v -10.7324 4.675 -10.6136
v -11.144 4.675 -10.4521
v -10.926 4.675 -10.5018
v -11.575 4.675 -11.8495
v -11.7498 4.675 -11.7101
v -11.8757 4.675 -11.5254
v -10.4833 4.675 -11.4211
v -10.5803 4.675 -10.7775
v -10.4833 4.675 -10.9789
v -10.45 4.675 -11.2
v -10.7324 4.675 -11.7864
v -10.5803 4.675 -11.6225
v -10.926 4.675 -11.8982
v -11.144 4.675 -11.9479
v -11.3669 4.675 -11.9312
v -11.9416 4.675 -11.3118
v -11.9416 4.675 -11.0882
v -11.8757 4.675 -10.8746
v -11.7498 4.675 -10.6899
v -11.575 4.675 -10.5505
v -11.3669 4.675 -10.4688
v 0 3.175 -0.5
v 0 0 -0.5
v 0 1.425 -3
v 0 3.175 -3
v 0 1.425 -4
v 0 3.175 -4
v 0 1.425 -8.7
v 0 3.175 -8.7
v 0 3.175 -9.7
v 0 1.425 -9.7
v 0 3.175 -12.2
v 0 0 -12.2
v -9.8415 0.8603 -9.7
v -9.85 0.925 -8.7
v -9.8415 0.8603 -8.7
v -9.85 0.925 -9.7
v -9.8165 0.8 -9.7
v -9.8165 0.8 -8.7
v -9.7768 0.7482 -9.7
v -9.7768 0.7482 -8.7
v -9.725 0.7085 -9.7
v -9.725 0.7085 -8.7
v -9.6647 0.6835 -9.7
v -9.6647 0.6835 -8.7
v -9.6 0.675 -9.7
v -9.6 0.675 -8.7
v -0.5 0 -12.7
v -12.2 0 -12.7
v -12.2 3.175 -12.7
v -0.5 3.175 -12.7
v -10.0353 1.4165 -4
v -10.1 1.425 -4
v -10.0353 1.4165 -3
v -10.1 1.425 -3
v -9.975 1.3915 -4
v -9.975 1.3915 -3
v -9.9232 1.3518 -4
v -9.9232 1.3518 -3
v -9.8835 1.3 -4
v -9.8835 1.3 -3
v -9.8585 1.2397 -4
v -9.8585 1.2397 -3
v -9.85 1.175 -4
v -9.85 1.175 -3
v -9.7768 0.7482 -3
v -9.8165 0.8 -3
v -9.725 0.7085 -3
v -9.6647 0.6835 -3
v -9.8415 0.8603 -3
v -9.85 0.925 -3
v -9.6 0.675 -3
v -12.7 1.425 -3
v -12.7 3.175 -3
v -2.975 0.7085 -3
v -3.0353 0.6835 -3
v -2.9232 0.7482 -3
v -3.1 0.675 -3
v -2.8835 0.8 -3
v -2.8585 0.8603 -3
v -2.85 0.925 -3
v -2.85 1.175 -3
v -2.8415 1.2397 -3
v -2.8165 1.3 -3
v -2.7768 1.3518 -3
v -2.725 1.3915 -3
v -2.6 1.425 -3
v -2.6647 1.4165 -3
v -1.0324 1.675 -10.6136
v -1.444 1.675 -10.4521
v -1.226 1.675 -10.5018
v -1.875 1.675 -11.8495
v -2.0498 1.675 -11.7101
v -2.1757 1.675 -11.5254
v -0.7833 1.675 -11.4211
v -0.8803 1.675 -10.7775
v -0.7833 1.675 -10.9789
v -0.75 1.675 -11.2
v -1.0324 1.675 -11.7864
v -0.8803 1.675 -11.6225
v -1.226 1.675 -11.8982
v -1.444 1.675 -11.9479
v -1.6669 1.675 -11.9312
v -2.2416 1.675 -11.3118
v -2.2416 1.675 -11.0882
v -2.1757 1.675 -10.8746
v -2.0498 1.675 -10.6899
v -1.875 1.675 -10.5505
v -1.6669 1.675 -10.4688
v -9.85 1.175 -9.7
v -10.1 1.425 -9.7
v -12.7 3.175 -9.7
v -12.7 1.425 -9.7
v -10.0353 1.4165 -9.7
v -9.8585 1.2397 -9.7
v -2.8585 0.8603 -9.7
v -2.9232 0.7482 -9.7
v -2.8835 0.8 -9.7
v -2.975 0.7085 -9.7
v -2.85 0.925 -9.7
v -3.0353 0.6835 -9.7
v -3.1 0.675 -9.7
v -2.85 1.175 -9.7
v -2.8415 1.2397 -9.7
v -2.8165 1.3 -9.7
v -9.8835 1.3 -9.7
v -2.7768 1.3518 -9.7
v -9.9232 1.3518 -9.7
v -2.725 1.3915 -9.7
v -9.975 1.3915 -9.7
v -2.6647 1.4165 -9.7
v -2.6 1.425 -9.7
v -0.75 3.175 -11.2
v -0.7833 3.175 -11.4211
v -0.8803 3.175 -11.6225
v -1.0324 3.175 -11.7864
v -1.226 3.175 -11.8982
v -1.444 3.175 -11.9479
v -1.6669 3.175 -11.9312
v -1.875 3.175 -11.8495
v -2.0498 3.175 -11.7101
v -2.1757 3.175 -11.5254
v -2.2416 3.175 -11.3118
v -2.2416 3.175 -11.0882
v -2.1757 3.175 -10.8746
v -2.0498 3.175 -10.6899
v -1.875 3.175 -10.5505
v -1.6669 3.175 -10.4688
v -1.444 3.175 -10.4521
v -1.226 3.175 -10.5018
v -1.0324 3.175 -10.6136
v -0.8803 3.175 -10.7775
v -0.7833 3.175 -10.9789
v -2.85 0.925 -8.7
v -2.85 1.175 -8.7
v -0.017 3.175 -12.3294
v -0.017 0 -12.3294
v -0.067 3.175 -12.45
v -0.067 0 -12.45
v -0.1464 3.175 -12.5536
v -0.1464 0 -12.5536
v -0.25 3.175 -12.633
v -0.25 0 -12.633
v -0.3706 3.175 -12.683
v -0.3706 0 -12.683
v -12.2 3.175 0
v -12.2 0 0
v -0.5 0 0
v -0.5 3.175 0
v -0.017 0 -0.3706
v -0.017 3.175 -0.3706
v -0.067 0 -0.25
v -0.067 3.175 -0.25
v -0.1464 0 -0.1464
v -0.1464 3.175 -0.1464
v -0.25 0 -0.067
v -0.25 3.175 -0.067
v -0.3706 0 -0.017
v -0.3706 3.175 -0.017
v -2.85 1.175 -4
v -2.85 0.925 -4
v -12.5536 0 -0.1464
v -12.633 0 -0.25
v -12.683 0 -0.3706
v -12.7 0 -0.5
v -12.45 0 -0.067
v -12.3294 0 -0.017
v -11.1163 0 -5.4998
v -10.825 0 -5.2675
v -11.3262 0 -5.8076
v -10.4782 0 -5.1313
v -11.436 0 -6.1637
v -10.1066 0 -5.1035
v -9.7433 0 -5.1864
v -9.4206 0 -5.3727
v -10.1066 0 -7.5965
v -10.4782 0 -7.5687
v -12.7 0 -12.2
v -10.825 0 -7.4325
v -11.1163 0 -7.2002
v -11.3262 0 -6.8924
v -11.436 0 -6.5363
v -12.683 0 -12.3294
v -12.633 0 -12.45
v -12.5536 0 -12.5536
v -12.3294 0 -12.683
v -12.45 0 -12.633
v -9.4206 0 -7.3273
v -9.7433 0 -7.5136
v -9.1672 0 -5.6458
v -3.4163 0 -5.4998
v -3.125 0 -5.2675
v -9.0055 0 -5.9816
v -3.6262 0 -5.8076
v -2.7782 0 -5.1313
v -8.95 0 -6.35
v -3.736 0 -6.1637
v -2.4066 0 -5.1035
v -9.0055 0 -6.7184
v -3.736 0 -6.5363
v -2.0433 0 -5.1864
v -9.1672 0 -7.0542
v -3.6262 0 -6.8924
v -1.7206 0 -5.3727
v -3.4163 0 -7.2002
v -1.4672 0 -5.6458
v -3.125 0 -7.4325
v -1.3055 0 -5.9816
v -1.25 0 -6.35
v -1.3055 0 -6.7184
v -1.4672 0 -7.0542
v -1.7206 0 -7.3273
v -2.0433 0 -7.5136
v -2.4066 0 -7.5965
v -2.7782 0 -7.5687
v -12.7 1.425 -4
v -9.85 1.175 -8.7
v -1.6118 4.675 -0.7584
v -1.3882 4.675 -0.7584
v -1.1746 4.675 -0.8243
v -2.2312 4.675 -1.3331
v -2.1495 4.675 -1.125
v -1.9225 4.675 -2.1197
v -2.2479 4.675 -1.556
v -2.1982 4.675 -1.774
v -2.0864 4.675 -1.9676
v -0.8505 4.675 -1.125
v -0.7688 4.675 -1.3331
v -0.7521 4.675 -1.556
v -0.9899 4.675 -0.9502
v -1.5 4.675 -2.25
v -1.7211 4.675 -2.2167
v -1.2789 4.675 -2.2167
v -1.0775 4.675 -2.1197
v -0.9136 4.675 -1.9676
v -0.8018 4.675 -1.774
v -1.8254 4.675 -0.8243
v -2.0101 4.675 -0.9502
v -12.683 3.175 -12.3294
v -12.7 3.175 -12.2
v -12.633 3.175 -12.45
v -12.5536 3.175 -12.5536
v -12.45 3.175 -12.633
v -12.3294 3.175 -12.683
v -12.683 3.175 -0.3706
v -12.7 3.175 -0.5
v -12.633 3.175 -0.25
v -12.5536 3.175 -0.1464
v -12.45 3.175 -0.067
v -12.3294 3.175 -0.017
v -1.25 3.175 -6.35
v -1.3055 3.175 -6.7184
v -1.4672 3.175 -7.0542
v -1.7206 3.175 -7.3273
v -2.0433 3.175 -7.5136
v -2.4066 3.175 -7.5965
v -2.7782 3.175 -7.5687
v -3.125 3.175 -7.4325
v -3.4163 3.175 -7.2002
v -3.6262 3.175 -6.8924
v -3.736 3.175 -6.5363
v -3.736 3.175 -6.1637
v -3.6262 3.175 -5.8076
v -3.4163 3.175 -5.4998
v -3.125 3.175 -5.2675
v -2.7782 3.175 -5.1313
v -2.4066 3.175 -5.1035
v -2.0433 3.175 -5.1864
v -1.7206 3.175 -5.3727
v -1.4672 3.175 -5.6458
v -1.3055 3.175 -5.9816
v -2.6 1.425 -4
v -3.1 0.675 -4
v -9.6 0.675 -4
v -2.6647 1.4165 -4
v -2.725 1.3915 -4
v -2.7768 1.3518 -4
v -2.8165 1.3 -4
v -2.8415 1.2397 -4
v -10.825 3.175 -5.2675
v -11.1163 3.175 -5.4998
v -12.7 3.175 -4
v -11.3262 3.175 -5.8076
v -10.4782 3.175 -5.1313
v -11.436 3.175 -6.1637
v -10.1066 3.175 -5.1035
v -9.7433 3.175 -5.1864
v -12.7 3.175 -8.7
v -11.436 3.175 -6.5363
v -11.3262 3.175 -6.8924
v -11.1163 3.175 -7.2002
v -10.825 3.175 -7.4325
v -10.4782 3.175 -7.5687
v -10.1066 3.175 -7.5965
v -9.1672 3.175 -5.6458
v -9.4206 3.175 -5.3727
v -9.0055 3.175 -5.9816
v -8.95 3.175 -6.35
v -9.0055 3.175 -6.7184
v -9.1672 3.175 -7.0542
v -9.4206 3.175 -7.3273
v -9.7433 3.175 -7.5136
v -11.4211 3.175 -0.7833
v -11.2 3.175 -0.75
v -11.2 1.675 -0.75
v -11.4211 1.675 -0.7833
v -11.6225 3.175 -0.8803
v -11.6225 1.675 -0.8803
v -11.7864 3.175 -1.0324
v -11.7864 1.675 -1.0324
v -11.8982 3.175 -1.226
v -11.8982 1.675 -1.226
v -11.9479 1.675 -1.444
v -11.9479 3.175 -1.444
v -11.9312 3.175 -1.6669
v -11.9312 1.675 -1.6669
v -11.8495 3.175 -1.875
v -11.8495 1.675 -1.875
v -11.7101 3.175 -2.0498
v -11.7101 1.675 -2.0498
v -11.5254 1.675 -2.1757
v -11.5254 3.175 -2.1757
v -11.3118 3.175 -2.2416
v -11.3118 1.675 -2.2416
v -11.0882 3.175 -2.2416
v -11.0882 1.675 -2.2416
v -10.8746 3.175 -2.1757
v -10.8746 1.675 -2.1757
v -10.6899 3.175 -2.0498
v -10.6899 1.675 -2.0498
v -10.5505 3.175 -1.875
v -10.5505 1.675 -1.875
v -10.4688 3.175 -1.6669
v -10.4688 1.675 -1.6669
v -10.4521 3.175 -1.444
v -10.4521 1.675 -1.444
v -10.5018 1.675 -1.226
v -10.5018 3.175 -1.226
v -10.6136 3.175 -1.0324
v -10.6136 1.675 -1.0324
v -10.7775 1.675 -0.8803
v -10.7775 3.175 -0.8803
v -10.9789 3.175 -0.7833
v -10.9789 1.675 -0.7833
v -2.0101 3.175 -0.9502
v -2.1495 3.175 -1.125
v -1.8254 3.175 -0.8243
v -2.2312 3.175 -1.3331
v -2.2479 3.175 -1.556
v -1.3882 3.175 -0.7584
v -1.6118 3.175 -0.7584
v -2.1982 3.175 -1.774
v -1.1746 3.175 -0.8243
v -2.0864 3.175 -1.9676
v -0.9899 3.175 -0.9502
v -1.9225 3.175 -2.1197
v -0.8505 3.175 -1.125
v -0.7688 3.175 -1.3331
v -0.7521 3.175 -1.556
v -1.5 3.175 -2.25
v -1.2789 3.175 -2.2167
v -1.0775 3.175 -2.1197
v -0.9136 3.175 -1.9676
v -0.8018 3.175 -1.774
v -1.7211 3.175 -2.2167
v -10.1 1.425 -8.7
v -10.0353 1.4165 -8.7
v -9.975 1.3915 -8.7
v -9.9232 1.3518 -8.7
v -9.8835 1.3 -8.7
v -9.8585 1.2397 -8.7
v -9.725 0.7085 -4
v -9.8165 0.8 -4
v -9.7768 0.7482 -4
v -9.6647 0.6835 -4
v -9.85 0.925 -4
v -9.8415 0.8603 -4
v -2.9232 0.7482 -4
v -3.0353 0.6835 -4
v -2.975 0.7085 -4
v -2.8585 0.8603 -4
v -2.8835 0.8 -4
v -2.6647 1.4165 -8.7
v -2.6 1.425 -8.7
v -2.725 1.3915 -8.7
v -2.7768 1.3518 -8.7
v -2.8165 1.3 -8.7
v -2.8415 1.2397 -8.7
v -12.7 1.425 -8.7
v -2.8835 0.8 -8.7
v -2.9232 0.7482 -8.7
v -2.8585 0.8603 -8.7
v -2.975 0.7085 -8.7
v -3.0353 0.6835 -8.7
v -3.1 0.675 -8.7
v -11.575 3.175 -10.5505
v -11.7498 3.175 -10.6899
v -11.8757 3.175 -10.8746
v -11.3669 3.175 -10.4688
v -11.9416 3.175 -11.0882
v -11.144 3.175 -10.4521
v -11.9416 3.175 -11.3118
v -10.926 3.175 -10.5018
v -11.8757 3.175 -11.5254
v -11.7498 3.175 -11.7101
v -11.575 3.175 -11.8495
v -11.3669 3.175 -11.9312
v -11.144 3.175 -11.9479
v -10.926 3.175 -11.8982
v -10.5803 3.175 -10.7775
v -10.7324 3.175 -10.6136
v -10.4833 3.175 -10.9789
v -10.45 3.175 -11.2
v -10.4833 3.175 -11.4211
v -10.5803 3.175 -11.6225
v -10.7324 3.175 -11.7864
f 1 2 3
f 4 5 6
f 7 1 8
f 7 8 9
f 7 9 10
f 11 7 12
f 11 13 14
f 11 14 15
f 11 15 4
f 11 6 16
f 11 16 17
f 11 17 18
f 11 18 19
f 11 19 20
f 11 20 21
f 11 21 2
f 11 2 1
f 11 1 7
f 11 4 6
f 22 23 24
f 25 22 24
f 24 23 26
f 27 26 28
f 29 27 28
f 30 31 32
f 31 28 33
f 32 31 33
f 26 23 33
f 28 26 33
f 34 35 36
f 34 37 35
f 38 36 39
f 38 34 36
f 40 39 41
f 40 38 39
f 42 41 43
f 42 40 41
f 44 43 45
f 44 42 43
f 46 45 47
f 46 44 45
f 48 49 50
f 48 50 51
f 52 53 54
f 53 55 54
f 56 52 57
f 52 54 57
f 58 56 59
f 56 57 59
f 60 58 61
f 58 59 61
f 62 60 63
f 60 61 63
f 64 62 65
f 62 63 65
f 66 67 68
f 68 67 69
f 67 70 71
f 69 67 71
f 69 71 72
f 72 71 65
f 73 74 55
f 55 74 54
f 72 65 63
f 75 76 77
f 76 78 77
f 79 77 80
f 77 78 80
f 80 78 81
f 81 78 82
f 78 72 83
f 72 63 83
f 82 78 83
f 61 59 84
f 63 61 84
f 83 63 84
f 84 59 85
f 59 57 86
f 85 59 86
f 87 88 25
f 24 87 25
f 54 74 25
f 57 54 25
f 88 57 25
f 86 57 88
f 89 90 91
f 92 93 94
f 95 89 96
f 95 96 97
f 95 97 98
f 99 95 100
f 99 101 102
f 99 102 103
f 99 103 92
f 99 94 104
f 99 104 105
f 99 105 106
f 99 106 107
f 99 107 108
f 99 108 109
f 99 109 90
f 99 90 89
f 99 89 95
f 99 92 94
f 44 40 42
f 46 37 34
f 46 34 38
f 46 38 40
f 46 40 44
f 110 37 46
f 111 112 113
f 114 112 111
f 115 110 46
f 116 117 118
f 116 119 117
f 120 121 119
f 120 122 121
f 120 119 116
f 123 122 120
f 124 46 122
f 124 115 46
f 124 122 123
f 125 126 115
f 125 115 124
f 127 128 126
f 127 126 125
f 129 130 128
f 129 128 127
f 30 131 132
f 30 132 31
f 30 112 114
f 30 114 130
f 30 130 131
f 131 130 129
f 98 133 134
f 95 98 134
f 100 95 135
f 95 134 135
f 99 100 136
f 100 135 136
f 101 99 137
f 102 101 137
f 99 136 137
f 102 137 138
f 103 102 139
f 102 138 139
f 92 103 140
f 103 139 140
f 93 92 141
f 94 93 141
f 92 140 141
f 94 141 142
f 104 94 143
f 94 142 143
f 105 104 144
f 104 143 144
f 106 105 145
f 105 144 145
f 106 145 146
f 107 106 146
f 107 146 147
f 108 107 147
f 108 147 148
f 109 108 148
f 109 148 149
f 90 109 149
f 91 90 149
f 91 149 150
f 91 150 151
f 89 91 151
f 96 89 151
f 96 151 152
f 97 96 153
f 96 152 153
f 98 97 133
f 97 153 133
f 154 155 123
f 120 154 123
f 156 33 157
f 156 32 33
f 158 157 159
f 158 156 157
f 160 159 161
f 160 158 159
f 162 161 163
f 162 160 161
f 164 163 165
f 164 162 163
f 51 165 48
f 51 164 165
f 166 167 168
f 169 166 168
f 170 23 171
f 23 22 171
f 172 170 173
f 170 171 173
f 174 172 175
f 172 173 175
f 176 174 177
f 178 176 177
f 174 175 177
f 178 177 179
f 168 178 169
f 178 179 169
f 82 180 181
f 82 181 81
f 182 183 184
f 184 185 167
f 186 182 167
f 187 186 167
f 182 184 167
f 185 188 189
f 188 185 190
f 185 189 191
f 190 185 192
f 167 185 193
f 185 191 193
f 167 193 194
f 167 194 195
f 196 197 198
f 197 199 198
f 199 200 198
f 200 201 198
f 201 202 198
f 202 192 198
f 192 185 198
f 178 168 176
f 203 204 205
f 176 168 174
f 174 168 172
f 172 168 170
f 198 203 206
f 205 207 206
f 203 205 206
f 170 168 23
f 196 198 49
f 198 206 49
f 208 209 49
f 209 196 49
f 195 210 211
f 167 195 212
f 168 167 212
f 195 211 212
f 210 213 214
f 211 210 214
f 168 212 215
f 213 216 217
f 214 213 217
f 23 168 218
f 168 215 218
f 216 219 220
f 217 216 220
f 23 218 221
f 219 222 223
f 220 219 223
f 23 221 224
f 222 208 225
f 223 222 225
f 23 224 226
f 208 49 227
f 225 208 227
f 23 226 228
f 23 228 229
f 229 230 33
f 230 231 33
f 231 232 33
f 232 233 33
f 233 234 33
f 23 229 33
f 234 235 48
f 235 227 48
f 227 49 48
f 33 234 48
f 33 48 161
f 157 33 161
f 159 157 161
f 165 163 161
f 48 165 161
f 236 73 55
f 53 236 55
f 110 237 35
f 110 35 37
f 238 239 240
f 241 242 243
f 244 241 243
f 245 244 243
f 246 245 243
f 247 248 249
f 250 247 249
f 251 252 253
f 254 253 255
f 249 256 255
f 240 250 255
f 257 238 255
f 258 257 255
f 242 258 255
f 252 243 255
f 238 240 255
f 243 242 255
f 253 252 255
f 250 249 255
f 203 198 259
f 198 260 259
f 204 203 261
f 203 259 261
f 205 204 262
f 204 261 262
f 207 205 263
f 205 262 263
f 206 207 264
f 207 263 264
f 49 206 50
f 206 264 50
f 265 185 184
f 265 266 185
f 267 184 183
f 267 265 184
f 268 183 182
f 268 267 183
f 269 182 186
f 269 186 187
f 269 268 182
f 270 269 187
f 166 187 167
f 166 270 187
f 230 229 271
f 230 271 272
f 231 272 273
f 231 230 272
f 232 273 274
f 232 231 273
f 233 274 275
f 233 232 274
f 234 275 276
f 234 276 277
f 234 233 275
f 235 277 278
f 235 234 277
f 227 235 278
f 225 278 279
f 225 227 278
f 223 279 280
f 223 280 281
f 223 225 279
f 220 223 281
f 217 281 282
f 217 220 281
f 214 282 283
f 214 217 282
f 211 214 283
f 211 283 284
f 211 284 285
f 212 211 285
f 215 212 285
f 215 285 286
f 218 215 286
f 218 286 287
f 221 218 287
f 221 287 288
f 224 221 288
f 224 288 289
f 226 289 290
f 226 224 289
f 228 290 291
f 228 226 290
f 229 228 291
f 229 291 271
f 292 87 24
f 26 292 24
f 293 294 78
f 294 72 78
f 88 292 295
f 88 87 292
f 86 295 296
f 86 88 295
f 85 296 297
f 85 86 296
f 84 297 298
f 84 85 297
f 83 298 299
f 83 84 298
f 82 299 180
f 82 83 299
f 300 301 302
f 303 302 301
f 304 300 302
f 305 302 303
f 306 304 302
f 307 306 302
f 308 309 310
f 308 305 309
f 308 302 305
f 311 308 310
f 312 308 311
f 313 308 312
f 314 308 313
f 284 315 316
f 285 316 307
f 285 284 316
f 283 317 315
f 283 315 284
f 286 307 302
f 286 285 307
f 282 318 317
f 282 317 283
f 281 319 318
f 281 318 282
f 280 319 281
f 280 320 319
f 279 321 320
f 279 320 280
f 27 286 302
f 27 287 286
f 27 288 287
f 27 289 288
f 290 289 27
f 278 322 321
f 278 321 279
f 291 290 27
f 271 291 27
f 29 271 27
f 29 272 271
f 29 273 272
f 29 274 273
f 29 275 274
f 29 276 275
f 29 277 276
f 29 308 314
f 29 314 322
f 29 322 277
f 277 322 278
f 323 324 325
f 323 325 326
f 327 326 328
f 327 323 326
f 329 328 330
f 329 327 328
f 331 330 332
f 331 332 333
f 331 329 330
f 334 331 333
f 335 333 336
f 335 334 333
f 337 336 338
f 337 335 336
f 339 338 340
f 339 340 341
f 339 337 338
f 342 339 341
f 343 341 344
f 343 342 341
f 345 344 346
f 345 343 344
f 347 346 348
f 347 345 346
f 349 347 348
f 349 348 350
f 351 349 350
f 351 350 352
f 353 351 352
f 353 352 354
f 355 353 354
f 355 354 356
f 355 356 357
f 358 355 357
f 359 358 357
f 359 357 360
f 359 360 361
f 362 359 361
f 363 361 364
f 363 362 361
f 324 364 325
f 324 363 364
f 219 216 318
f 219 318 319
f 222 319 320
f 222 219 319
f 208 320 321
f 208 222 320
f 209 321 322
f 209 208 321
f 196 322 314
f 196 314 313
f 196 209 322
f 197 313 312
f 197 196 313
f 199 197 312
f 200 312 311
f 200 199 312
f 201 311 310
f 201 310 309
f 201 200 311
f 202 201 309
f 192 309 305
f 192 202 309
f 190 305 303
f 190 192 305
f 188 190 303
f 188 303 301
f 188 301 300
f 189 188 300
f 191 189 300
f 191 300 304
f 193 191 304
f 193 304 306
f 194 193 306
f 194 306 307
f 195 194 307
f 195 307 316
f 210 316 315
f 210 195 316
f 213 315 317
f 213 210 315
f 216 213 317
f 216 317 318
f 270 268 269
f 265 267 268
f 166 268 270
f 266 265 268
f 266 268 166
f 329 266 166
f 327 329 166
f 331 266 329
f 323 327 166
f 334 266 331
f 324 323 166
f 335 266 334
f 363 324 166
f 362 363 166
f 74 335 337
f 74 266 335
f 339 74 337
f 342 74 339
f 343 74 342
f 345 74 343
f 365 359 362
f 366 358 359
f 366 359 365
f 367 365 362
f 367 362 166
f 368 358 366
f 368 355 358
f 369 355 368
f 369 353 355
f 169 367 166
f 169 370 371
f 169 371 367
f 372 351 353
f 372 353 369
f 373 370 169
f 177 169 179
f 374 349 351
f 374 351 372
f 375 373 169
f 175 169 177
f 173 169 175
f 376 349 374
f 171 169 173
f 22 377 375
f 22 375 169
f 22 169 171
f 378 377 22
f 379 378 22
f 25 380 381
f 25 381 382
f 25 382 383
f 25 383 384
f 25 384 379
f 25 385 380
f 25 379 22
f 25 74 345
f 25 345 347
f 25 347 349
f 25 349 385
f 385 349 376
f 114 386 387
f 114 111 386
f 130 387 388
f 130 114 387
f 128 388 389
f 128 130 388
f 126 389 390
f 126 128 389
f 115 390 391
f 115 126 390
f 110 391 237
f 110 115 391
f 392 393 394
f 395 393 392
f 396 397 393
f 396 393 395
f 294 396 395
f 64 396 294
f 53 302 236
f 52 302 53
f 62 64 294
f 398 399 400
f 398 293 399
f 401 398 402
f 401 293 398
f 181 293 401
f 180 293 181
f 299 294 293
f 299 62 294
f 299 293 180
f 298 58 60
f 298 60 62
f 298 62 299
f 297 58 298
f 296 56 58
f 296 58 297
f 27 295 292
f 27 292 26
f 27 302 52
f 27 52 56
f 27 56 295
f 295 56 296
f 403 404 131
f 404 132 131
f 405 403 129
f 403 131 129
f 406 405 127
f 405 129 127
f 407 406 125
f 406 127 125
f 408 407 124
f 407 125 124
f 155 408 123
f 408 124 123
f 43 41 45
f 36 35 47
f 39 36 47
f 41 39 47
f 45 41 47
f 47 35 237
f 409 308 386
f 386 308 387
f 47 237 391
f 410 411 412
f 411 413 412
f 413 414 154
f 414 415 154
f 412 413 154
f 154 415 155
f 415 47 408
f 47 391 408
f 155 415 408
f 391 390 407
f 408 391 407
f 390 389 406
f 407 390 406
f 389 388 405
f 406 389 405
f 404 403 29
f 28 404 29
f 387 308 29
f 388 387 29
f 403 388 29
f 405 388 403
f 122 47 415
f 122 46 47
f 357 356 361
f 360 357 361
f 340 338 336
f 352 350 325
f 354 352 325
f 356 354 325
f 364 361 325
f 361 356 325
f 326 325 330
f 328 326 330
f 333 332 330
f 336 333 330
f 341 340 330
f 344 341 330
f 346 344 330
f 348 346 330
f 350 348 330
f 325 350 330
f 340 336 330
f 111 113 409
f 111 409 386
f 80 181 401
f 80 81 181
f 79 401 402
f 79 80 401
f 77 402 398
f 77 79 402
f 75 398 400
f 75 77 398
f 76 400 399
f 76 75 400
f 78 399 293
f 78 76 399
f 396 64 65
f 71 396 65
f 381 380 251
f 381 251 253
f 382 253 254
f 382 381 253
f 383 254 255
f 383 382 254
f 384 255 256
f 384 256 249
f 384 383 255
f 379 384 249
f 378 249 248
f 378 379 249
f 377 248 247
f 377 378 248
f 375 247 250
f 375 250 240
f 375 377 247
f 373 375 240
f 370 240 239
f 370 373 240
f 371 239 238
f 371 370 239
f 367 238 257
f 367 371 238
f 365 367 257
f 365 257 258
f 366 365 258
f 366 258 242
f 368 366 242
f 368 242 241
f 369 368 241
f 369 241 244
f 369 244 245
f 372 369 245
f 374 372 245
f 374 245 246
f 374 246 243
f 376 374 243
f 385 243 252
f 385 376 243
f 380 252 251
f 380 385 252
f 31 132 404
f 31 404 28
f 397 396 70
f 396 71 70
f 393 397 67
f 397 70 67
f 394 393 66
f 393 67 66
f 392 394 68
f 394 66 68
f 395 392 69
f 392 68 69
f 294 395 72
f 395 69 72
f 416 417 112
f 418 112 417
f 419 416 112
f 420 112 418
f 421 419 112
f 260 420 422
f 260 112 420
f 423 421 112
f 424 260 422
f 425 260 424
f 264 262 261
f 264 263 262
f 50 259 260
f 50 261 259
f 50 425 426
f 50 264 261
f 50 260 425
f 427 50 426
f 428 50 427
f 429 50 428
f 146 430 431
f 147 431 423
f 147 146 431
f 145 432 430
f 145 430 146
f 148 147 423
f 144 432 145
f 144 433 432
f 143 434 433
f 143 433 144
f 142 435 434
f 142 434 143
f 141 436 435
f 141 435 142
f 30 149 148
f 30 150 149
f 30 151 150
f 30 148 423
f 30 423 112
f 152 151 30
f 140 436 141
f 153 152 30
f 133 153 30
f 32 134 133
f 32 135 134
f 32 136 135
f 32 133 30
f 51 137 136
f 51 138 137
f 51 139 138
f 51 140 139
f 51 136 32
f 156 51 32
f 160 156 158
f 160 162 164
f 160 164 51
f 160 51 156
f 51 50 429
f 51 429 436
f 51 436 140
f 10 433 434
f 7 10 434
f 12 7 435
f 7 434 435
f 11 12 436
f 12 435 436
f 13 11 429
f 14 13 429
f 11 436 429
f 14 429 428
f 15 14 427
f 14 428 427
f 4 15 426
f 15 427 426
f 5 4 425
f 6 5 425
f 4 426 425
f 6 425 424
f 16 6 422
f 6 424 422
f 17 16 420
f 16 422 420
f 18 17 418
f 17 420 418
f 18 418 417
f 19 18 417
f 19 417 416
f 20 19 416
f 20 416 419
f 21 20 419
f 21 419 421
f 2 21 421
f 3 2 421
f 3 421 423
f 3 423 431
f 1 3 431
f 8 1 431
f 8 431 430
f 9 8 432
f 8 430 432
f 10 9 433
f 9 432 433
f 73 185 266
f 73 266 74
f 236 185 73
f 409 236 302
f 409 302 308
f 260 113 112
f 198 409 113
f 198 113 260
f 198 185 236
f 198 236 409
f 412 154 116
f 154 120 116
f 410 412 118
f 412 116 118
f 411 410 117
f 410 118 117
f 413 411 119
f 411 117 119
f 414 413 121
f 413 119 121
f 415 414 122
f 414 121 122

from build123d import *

# Parameters (mm, degrees)
SKETCH1_W            = 12.7
SKETCH1_H            = 12.7
SKETCH1_R            = 1.25
BOSS_EXTRUDE1_DEPTH  = 3.175
SKETCH2_R            = 0.75
BOSS_EXTRUDE2_DEPTH  = 1.5
SKETCH3_R            = 0.75
CUT_EXTRUDE1_DEPTH   = 1.5
SKETCH4_W            = 12.7
SKETCH4_H            = 1
CUT_EXTRUDE2_DEPTH   = 1.75
SKETCH5_W            = 7
SKETCH5_H            = 1
CUT_EXTRUDE3_DEPTH   = 0.75
FILLET1_R            = 0.25
FILLET2_R            = 0.5
FILLET1_OF_MIRROR3_R = 0.25


with BuildPart() as part:
    # Sketch1 → Boss-Extrude1 (new body)
    with BuildSketch(Plane(origin=(0, 0, 0), x_dir=(1, 0, 0), z_dir=(0, 1, 0))):
        with Locations((-6.35, 6.35)):
            Rectangle(SKETCH1_W, SKETCH1_H)
        with Locations((-2.5, 6.35)):
            Circle(SKETCH1_R, mode=Mode.SUBTRACT)
        with Locations((-10.2, 6.35)):
            Circle(SKETCH1_R, mode=Mode.SUBTRACT)
    extrude(amount=BOSS_EXTRUDE1_DEPTH)

    # Sketch2 → Boss-Extrude2 (add)
    with BuildSketch(Plane(origin=(0, 3.175, 0), x_dir=(1, 0, 0), z_dir=(0, 1, 0))):
        with Locations((-11.2, 11.2)):
            Circle(SKETCH2_R)
    boss_extrude2 = extrude(amount=BOSS_EXTRUDE2_DEPTH)

    # Sketch3 → Cut-Extrude1 (cut)
    with BuildSketch(Plane(origin=(0, 3.175, 0), x_dir=(1, 0, 0), z_dir=(0, 1, 0))):
        with Locations((-1.5, 11.2)):
            Circle(SKETCH3_R)
    cut_extrude1 = extrude(amount=-CUT_EXTRUDE1_DEPTH, mode=Mode.SUBTRACT)

    # Mirror1: Boss-Extrude2 across plane
    add(boss_extrude2.mirror(Plane(origin=(-6.35, 0, -6.35), x_dir=(-0.707106781, 0, 0.707106781), z_dir=(-0.707106781, 0, -0.707106781))))

    # Mirror2: Cut-Extrude1 across plane
    add(cut_extrude1.mirror(Plane(origin=(0, 0, 0), x_dir=(0.707106781, 0, 0.707106781), z_dir=(-0.707106781, 0, 0.707106781))), mode=Mode.SUBTRACT)

    # Sketch4 → Cut-Extrude2 (cut)
    with BuildSketch(Plane(origin=(0, 3.175, 0), x_dir=(1, 0, 0), z_dir=(0, 1, 0))):
        with Locations((-6.35, 9.2)):
            Rectangle(SKETCH4_W, SKETCH4_H)
    cut_extrude2 = extrude(amount=-CUT_EXTRUDE2_DEPTH, mode=Mode.SUBTRACT)

    # Sketch5 → Cut-Extrude3 (cut)
    with BuildSketch(Plane(origin=(0, 1.425, 0), x_dir=(1, 0, 0), z_dir=(0, 1, 0))):
        with Locations((-6.35, 9.2)):
            Rectangle(SKETCH5_W, SKETCH5_H)
    cut_extrude3 = extrude(amount=-CUT_EXTRUDE3_DEPTH, mode=Mode.SUBTRACT)

    # Fillet1
    fillet1_edges = [part.edges().sort_by_distance(p)[0] for p in [
        (-9.85, 0.675, -9.2),
        (-2.85, 0.675, -9.2),
        (-9.85, 1.425, -9.2),
        (-2.85, 1.425, -9.2),
    ]]
    fillet(fillet1_edges, radius=FILLET1_R)

    # Fillet2
    fillet2_edges = [part.edges().sort_by_distance(p)[0] for p in [
        (0, 1.5875, 0),
        (-12.7, 1.5875, 0),
        (-12.7, 1.5875, -12.7),
        (0, 1.5875, -12.7),
    ]]
    fillet(fillet2_edges, radius=FILLET2_R)

    # Mirror3: Cut-Extrude2, Cut-Extrude3 across plane
    add(cut_extrude2.mirror(Plane(origin=(0, 0, -6.35), x_dir=(1, 0, 0), z_dir=(0, 0, -1))), mode=Mode.SUBTRACT)
    add(cut_extrude3.mirror(Plane(origin=(0, 0, -6.35), x_dir=(1, 0, 0), z_dir=(0, 0, -1))), mode=Mode.SUBTRACT)

    # Fillet1 of Mirror3
    fillet1_of_mirror3_edges = [part.edges().sort_by_distance(p)[0] for p in [
        (-9.85, 0.675, -3.5),
        (-2.85, 0.675, -3.5),
        (-9.85, 1.425, -3.5),
        (-2.85, 1.425, -3.5),
    ]]
    fillet(fillet1_of_mirror3_edges, radius=FILLET1_OF_MIRROR3_R)


solid = part.part
